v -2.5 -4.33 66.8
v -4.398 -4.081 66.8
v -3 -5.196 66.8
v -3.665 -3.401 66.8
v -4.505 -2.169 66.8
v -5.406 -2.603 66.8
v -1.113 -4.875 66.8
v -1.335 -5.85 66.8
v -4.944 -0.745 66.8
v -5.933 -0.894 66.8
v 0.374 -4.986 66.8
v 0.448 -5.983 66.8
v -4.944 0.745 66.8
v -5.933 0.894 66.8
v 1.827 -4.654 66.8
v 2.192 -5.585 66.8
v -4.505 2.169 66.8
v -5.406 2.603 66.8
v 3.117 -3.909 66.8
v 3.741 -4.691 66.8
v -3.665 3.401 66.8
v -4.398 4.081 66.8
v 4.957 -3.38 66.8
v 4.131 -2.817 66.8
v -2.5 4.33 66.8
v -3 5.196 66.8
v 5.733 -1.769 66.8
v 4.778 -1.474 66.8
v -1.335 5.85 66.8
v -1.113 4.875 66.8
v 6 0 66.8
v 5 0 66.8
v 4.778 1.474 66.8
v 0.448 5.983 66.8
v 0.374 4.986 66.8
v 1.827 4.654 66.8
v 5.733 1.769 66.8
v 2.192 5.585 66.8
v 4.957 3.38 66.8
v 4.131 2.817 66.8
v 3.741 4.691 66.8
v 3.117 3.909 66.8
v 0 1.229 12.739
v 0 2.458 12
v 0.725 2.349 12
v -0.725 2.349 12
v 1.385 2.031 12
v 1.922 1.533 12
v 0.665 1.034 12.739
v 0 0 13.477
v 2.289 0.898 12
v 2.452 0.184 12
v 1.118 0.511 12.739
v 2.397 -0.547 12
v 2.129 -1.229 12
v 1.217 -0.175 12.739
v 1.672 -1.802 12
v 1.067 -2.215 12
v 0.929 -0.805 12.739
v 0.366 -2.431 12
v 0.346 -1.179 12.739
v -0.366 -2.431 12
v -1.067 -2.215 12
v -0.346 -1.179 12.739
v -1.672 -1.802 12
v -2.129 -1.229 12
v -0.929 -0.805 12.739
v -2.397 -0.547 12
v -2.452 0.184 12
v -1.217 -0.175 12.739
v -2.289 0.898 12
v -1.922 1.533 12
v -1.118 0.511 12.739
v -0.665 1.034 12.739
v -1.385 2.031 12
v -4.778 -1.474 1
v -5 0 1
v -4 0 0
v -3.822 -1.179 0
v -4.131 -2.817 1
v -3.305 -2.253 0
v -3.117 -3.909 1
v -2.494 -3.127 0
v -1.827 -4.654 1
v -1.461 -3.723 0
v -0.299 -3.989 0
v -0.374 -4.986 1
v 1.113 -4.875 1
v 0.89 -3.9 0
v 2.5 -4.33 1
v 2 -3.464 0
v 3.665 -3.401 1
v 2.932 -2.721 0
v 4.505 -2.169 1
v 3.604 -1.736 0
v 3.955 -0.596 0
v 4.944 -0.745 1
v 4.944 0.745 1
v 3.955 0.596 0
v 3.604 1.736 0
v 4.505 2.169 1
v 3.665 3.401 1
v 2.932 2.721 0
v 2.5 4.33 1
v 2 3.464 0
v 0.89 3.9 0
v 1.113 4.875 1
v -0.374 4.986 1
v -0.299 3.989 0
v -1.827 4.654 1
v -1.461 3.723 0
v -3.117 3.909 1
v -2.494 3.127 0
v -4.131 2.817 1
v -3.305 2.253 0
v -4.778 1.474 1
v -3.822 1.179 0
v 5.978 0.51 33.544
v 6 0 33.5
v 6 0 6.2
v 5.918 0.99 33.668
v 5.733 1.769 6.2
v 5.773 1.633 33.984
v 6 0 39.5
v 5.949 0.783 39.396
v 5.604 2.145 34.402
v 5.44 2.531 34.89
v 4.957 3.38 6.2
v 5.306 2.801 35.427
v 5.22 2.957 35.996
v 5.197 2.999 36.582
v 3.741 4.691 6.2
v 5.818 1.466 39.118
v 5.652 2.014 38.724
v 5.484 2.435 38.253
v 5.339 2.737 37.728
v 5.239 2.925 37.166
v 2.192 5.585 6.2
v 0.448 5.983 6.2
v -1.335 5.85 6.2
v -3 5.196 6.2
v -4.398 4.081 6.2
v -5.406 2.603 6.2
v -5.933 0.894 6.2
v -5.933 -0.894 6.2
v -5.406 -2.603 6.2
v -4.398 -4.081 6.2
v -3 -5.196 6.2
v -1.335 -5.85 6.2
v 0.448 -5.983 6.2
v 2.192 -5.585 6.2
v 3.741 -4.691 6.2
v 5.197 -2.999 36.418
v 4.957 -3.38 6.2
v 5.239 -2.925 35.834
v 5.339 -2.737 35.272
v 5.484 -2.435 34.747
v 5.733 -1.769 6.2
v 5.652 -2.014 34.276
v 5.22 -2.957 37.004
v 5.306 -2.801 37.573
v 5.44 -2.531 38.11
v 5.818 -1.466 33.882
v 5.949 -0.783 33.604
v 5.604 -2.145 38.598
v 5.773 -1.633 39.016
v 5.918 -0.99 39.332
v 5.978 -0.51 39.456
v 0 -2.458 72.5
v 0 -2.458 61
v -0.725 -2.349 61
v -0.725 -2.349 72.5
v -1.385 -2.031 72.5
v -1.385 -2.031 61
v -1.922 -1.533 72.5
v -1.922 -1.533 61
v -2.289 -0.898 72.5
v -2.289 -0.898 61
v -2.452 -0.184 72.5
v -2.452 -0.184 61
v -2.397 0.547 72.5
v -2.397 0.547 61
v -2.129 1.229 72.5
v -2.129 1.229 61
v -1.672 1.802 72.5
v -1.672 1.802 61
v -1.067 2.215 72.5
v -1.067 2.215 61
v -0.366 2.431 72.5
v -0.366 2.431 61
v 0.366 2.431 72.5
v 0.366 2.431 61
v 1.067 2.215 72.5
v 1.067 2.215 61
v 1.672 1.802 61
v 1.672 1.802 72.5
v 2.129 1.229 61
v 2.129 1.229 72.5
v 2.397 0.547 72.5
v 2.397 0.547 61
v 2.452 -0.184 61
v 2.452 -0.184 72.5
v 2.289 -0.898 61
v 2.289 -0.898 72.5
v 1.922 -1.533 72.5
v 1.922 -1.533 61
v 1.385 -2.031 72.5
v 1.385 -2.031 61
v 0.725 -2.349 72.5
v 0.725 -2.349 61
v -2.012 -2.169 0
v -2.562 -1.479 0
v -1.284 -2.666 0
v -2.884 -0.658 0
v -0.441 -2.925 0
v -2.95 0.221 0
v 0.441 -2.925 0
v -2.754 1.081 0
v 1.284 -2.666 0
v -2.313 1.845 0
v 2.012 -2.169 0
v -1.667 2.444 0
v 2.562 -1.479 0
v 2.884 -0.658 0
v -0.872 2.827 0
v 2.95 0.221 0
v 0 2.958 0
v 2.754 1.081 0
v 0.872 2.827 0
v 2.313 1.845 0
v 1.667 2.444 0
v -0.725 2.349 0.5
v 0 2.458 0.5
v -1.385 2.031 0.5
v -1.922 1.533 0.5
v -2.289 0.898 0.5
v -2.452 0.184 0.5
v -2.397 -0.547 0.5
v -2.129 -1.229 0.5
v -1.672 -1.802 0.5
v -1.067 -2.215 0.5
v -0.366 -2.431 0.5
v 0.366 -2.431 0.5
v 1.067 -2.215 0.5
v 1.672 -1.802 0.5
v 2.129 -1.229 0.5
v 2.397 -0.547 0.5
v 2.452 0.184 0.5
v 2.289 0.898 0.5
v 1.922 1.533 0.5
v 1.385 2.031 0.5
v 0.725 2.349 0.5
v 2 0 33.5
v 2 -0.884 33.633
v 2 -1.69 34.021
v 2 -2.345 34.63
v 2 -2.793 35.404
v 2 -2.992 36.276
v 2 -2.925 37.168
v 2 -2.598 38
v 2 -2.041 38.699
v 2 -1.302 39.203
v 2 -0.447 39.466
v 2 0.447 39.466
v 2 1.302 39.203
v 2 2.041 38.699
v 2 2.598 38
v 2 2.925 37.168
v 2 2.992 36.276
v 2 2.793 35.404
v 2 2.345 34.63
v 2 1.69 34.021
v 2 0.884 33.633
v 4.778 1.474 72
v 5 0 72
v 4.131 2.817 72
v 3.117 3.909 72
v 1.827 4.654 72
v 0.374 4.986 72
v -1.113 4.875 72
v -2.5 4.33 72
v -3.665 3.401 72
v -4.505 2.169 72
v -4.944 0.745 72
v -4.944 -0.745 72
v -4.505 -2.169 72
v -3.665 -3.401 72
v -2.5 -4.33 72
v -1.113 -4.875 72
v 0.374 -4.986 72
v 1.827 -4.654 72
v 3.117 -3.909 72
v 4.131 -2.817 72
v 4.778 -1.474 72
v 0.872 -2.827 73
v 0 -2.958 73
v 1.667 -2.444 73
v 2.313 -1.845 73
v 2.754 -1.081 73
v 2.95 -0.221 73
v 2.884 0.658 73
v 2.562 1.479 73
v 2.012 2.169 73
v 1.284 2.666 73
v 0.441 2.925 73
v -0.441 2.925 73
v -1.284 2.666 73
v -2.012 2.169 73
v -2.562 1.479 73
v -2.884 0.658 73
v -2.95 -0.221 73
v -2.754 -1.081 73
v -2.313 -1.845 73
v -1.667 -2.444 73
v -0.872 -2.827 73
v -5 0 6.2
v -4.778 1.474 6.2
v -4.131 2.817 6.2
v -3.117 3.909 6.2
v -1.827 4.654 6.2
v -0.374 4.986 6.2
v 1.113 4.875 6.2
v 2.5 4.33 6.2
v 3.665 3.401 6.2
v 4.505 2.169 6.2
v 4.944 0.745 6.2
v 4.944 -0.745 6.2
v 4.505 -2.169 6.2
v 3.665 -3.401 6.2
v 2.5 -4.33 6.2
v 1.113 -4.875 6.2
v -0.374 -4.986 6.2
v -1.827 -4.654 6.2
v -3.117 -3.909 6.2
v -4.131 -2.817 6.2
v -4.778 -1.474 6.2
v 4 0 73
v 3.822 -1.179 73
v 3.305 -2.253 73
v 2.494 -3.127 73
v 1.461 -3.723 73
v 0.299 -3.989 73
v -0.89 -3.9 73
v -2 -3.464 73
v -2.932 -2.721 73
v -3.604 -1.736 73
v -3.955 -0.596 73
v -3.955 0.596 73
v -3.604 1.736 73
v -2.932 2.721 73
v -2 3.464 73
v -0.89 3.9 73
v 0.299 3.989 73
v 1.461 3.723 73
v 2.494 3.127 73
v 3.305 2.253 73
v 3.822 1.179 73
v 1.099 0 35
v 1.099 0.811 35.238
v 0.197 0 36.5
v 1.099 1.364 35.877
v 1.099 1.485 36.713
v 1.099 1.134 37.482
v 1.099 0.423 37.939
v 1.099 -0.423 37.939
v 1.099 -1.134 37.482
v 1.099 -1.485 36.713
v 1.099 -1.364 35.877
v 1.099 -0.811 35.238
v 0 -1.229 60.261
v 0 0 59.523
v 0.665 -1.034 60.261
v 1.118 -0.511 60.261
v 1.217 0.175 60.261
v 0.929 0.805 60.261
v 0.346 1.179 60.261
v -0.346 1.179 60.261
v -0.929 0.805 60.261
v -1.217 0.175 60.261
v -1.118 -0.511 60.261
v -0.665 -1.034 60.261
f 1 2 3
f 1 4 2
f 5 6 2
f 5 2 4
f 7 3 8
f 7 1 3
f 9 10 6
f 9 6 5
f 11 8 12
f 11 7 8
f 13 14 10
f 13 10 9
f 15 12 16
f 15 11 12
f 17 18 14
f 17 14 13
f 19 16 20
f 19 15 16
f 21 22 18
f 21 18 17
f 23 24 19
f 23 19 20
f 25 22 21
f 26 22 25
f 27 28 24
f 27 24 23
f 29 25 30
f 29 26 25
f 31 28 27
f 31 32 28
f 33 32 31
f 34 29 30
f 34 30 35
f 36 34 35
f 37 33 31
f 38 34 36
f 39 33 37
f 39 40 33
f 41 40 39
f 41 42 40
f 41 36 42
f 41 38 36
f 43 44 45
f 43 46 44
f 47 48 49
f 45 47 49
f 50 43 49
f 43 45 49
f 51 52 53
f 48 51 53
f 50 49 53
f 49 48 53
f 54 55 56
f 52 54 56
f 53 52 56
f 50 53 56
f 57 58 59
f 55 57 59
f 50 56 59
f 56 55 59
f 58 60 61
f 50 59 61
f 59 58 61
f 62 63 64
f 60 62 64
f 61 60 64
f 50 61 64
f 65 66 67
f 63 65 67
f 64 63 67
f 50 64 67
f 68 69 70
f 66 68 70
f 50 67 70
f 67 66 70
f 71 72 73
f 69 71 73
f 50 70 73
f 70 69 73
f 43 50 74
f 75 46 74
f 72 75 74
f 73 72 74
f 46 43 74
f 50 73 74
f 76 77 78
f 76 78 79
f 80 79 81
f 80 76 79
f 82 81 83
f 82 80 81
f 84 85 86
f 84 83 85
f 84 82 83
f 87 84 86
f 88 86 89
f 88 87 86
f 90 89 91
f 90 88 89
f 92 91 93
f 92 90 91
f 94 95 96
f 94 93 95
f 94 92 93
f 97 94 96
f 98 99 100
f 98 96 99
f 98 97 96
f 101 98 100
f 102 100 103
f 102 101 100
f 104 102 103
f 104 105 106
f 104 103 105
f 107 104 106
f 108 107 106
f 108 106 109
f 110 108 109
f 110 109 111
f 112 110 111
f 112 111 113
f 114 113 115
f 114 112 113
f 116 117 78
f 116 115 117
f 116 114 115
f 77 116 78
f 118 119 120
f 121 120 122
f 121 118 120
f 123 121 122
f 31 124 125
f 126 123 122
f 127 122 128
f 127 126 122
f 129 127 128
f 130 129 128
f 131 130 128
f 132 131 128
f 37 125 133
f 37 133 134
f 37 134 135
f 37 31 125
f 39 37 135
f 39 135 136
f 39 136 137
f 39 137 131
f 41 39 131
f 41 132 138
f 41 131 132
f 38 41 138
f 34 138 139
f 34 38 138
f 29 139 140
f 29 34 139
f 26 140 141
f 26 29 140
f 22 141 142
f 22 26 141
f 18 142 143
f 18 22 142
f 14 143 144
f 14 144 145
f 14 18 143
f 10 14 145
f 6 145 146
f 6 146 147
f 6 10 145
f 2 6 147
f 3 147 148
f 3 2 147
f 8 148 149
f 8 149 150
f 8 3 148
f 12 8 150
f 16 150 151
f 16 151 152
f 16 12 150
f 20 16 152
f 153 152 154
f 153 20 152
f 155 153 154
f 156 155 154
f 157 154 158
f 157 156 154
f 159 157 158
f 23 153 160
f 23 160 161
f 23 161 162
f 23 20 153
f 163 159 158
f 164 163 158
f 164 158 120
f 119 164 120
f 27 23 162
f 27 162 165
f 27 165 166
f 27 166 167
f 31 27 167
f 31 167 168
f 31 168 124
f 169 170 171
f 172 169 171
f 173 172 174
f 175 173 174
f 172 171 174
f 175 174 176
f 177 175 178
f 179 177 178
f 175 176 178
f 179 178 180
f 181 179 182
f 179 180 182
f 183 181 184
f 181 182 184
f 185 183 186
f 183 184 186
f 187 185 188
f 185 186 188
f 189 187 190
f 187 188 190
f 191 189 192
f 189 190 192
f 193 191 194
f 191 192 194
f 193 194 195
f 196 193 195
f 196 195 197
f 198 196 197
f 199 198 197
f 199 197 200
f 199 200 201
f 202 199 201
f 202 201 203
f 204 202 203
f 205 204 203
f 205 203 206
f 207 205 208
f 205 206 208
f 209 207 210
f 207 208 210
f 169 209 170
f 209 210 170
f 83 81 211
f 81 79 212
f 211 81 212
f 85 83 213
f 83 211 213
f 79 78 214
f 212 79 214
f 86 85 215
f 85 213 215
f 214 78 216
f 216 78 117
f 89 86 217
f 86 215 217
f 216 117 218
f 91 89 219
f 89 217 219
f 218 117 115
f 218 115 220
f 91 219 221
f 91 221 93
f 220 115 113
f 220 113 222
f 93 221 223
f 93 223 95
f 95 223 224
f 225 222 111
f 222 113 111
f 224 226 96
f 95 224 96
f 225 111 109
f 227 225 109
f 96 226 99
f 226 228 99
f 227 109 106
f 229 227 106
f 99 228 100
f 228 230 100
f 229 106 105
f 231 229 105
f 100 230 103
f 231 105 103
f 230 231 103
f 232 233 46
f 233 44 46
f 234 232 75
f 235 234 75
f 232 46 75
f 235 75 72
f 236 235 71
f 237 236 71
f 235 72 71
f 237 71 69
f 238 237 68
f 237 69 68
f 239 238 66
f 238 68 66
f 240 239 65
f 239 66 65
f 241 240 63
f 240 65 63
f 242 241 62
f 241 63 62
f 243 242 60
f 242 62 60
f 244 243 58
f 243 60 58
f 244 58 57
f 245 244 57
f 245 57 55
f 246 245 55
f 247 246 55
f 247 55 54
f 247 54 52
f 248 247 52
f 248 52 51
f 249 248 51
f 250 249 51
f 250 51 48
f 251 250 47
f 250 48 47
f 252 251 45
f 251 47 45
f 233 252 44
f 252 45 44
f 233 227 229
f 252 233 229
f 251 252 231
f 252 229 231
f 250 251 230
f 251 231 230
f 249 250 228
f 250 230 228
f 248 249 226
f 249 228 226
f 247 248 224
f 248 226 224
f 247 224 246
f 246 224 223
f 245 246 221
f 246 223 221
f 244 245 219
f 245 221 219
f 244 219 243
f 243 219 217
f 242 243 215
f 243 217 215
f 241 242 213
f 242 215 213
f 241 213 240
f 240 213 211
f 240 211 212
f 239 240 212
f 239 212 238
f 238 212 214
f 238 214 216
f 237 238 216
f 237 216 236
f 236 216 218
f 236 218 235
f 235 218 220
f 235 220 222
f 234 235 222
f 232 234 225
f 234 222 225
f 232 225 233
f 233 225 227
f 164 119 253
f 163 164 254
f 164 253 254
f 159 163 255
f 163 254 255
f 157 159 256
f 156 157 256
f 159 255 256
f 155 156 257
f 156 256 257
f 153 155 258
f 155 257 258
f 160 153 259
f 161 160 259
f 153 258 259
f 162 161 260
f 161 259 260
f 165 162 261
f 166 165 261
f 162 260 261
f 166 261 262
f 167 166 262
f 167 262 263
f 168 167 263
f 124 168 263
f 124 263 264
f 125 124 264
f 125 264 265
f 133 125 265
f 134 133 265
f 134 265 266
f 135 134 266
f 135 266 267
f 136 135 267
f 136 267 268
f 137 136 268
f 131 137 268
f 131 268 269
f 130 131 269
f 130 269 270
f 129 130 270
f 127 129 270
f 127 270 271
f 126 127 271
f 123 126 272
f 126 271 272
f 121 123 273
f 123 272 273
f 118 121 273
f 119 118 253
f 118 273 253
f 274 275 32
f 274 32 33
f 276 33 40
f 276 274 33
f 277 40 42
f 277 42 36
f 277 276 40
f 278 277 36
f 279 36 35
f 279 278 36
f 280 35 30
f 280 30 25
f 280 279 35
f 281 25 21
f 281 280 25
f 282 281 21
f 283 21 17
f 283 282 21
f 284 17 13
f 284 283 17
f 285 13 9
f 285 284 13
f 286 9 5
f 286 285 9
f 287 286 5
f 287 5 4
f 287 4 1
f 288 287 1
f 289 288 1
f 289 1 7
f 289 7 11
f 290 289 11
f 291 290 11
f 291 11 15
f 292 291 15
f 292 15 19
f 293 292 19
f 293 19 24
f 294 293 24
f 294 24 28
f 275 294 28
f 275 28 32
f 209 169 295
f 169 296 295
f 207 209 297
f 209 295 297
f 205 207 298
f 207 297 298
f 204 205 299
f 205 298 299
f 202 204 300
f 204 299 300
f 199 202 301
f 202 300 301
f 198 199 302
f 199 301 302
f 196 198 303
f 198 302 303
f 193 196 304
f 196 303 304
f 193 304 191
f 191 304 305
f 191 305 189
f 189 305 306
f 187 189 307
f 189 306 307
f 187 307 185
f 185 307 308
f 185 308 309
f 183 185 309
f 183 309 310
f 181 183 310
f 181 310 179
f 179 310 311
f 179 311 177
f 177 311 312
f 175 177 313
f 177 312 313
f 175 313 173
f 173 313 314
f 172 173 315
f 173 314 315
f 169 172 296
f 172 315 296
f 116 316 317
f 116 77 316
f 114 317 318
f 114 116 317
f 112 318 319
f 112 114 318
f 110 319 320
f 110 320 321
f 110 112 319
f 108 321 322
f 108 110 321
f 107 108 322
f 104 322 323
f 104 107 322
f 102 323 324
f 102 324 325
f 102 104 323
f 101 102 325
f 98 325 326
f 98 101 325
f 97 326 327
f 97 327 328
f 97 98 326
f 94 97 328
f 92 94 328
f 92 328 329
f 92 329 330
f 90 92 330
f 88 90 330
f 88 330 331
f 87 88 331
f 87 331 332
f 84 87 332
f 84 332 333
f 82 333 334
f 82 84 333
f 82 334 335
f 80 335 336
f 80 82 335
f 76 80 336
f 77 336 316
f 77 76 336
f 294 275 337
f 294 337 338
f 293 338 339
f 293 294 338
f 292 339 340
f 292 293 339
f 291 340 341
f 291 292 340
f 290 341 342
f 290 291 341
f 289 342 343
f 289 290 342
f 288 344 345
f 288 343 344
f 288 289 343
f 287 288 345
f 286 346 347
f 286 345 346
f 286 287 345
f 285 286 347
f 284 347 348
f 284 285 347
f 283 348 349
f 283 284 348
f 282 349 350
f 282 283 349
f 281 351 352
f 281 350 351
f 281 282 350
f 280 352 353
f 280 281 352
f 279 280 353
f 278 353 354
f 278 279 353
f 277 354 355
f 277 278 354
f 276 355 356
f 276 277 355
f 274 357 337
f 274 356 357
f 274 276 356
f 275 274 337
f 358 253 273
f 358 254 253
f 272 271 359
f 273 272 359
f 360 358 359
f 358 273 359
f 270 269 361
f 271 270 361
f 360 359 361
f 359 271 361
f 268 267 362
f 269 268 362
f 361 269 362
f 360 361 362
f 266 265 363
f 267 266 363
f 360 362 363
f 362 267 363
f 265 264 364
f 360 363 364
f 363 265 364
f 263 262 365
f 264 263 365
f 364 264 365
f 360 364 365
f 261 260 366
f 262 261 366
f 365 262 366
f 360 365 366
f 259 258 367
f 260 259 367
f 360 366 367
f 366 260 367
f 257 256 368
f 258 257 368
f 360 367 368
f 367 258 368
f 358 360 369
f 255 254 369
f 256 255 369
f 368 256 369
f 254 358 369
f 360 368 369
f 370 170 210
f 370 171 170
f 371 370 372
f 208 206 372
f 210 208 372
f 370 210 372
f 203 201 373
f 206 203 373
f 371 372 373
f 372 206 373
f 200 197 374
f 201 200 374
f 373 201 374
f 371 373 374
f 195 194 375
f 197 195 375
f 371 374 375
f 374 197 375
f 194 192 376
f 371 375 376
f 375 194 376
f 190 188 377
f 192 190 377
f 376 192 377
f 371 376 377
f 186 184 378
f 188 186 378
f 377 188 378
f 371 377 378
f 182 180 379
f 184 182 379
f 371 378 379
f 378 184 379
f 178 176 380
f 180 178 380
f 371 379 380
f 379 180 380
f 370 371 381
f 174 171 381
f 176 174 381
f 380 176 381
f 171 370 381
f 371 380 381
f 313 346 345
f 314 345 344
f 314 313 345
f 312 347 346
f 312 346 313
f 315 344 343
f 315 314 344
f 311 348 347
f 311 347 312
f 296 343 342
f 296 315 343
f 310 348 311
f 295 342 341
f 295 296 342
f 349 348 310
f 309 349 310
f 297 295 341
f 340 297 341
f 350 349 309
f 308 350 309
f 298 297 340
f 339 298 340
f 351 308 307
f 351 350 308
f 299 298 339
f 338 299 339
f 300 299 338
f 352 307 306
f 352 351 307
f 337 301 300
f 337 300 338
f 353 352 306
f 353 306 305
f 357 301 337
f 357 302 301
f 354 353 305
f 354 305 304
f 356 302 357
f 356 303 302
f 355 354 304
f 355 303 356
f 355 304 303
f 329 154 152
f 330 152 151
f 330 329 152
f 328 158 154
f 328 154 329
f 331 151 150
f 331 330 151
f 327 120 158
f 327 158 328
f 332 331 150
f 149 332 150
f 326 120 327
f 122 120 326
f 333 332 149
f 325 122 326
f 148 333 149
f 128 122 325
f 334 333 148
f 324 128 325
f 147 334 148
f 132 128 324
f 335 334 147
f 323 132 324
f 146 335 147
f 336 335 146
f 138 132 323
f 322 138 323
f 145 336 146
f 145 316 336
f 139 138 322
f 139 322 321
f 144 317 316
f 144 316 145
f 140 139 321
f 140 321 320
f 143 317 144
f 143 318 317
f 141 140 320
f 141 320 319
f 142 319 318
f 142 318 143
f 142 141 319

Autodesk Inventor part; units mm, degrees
ref_plane "XZ Plane" through (0, 0, 0) normal (0, 1, 0) x (-1, 0, 0)
ref_plane "XY Plane" through (0, 0, 0) normal (0, 0, 1) x (1, 0, 0)
sketch "Sketch1" plane through (0, 0, 0) normal (0, 0, 1) x (1, 0, 0)
  circle A0 centre (0, 0) radius 8
  dimension "d0" = 16
extrude "Extrusion1" add sketch "Sketch1" along normal blind 73
sketch "Sketch2" plane through (0, 0, 0) normal (0, 0, -1) x (-1, 0, 0)
  circle A0 centre (0, 0) radius 8 projected
  circle A1 centre (0, 0) radius 5
  dimension "d6" = 10
extrude "Extrusion2" cut sketch "Sketch2" against normal blind 6.2
sketch "Sketch3" plane through (0, 0, 73) normal (0, 0, 1) x (1, 0, 0)
  circle A0 centre (0, 0) radius 8 projected
  circle A1 centre (0, 0) radius 5
  dimension "d9" = 10
extrude "Extrusion3" cut sketch "Sketch3" against normal blind 6.2
chamfer "Chamfer2" distance 1 angle 45 2 edges at (-5, 0, 73) (5, 0, 0)
sketch "Sketch4" plane through (0, 0, 0) normal (0, 0, -1) x (-1, 0, 0)
  circle A0 centre (0, 0) radius 4 projected
hole "Hole1" at (0, 0, 0) direction (0, 0, 1) diameter 4.917 depth 12 tip angle 118 thread size "M6x1" class "6H" standard "ANSI Metric M Profile"
sketch "Sketch5" plane through (0, 0, 73) normal (0, 0, 1) x (1, 0, 0)
  circle A0 centre (0, 0) radius 4 projected
hole "Hole2" at (0, 0, 73) direction (0, 0, -1) diameter 4.917 depth 12 tip angle 118 thread size "M6x1" class "6H" standard "ANSI Metric M Profile"
chamfer "Chamfer3" distance 0.5 angle 45 2 edges at (0, 2.4585, 73) (0, -2.4585, 0)
sketch "Sketch6" plane through (0, 0, 66.8) normal (0, 0, 1) x (1, 0, 0)
  circle A0 centre (0, 0) radius 8 projected
  circle A1 centre (0, 0) radius 6
  dimension "d32" = 12
extrude "Extrusion4" cut sketch "Sketch6" against normal blind 60.6
ref_plane "Work Plane1" through (6, 0, 66.8) normal (1, 0, 0) x (0, 1, 0)
sketch "Sketch7" plane through (6, 0, 66.8) normal (1, 0, 0) x (0, 1, 0)
  line L0 (-6, -60.6) -> (6, -60.6) projected
  line L1 (6, 0) -> (-6, 0) projected
  circle A0 centre (0, -30.3) radius 3
  point P0 (0, -66.8)
  dimension "d35" = 6
  dimension "d36" = 30.3
hole "Hole3" at (6, 0, 36.5) direction (-1, 0, 0) diameter 6 depth 4 tip angle 118
properties part number "EIXO DIANTEIRO(34)" material "Carbon Steel"
